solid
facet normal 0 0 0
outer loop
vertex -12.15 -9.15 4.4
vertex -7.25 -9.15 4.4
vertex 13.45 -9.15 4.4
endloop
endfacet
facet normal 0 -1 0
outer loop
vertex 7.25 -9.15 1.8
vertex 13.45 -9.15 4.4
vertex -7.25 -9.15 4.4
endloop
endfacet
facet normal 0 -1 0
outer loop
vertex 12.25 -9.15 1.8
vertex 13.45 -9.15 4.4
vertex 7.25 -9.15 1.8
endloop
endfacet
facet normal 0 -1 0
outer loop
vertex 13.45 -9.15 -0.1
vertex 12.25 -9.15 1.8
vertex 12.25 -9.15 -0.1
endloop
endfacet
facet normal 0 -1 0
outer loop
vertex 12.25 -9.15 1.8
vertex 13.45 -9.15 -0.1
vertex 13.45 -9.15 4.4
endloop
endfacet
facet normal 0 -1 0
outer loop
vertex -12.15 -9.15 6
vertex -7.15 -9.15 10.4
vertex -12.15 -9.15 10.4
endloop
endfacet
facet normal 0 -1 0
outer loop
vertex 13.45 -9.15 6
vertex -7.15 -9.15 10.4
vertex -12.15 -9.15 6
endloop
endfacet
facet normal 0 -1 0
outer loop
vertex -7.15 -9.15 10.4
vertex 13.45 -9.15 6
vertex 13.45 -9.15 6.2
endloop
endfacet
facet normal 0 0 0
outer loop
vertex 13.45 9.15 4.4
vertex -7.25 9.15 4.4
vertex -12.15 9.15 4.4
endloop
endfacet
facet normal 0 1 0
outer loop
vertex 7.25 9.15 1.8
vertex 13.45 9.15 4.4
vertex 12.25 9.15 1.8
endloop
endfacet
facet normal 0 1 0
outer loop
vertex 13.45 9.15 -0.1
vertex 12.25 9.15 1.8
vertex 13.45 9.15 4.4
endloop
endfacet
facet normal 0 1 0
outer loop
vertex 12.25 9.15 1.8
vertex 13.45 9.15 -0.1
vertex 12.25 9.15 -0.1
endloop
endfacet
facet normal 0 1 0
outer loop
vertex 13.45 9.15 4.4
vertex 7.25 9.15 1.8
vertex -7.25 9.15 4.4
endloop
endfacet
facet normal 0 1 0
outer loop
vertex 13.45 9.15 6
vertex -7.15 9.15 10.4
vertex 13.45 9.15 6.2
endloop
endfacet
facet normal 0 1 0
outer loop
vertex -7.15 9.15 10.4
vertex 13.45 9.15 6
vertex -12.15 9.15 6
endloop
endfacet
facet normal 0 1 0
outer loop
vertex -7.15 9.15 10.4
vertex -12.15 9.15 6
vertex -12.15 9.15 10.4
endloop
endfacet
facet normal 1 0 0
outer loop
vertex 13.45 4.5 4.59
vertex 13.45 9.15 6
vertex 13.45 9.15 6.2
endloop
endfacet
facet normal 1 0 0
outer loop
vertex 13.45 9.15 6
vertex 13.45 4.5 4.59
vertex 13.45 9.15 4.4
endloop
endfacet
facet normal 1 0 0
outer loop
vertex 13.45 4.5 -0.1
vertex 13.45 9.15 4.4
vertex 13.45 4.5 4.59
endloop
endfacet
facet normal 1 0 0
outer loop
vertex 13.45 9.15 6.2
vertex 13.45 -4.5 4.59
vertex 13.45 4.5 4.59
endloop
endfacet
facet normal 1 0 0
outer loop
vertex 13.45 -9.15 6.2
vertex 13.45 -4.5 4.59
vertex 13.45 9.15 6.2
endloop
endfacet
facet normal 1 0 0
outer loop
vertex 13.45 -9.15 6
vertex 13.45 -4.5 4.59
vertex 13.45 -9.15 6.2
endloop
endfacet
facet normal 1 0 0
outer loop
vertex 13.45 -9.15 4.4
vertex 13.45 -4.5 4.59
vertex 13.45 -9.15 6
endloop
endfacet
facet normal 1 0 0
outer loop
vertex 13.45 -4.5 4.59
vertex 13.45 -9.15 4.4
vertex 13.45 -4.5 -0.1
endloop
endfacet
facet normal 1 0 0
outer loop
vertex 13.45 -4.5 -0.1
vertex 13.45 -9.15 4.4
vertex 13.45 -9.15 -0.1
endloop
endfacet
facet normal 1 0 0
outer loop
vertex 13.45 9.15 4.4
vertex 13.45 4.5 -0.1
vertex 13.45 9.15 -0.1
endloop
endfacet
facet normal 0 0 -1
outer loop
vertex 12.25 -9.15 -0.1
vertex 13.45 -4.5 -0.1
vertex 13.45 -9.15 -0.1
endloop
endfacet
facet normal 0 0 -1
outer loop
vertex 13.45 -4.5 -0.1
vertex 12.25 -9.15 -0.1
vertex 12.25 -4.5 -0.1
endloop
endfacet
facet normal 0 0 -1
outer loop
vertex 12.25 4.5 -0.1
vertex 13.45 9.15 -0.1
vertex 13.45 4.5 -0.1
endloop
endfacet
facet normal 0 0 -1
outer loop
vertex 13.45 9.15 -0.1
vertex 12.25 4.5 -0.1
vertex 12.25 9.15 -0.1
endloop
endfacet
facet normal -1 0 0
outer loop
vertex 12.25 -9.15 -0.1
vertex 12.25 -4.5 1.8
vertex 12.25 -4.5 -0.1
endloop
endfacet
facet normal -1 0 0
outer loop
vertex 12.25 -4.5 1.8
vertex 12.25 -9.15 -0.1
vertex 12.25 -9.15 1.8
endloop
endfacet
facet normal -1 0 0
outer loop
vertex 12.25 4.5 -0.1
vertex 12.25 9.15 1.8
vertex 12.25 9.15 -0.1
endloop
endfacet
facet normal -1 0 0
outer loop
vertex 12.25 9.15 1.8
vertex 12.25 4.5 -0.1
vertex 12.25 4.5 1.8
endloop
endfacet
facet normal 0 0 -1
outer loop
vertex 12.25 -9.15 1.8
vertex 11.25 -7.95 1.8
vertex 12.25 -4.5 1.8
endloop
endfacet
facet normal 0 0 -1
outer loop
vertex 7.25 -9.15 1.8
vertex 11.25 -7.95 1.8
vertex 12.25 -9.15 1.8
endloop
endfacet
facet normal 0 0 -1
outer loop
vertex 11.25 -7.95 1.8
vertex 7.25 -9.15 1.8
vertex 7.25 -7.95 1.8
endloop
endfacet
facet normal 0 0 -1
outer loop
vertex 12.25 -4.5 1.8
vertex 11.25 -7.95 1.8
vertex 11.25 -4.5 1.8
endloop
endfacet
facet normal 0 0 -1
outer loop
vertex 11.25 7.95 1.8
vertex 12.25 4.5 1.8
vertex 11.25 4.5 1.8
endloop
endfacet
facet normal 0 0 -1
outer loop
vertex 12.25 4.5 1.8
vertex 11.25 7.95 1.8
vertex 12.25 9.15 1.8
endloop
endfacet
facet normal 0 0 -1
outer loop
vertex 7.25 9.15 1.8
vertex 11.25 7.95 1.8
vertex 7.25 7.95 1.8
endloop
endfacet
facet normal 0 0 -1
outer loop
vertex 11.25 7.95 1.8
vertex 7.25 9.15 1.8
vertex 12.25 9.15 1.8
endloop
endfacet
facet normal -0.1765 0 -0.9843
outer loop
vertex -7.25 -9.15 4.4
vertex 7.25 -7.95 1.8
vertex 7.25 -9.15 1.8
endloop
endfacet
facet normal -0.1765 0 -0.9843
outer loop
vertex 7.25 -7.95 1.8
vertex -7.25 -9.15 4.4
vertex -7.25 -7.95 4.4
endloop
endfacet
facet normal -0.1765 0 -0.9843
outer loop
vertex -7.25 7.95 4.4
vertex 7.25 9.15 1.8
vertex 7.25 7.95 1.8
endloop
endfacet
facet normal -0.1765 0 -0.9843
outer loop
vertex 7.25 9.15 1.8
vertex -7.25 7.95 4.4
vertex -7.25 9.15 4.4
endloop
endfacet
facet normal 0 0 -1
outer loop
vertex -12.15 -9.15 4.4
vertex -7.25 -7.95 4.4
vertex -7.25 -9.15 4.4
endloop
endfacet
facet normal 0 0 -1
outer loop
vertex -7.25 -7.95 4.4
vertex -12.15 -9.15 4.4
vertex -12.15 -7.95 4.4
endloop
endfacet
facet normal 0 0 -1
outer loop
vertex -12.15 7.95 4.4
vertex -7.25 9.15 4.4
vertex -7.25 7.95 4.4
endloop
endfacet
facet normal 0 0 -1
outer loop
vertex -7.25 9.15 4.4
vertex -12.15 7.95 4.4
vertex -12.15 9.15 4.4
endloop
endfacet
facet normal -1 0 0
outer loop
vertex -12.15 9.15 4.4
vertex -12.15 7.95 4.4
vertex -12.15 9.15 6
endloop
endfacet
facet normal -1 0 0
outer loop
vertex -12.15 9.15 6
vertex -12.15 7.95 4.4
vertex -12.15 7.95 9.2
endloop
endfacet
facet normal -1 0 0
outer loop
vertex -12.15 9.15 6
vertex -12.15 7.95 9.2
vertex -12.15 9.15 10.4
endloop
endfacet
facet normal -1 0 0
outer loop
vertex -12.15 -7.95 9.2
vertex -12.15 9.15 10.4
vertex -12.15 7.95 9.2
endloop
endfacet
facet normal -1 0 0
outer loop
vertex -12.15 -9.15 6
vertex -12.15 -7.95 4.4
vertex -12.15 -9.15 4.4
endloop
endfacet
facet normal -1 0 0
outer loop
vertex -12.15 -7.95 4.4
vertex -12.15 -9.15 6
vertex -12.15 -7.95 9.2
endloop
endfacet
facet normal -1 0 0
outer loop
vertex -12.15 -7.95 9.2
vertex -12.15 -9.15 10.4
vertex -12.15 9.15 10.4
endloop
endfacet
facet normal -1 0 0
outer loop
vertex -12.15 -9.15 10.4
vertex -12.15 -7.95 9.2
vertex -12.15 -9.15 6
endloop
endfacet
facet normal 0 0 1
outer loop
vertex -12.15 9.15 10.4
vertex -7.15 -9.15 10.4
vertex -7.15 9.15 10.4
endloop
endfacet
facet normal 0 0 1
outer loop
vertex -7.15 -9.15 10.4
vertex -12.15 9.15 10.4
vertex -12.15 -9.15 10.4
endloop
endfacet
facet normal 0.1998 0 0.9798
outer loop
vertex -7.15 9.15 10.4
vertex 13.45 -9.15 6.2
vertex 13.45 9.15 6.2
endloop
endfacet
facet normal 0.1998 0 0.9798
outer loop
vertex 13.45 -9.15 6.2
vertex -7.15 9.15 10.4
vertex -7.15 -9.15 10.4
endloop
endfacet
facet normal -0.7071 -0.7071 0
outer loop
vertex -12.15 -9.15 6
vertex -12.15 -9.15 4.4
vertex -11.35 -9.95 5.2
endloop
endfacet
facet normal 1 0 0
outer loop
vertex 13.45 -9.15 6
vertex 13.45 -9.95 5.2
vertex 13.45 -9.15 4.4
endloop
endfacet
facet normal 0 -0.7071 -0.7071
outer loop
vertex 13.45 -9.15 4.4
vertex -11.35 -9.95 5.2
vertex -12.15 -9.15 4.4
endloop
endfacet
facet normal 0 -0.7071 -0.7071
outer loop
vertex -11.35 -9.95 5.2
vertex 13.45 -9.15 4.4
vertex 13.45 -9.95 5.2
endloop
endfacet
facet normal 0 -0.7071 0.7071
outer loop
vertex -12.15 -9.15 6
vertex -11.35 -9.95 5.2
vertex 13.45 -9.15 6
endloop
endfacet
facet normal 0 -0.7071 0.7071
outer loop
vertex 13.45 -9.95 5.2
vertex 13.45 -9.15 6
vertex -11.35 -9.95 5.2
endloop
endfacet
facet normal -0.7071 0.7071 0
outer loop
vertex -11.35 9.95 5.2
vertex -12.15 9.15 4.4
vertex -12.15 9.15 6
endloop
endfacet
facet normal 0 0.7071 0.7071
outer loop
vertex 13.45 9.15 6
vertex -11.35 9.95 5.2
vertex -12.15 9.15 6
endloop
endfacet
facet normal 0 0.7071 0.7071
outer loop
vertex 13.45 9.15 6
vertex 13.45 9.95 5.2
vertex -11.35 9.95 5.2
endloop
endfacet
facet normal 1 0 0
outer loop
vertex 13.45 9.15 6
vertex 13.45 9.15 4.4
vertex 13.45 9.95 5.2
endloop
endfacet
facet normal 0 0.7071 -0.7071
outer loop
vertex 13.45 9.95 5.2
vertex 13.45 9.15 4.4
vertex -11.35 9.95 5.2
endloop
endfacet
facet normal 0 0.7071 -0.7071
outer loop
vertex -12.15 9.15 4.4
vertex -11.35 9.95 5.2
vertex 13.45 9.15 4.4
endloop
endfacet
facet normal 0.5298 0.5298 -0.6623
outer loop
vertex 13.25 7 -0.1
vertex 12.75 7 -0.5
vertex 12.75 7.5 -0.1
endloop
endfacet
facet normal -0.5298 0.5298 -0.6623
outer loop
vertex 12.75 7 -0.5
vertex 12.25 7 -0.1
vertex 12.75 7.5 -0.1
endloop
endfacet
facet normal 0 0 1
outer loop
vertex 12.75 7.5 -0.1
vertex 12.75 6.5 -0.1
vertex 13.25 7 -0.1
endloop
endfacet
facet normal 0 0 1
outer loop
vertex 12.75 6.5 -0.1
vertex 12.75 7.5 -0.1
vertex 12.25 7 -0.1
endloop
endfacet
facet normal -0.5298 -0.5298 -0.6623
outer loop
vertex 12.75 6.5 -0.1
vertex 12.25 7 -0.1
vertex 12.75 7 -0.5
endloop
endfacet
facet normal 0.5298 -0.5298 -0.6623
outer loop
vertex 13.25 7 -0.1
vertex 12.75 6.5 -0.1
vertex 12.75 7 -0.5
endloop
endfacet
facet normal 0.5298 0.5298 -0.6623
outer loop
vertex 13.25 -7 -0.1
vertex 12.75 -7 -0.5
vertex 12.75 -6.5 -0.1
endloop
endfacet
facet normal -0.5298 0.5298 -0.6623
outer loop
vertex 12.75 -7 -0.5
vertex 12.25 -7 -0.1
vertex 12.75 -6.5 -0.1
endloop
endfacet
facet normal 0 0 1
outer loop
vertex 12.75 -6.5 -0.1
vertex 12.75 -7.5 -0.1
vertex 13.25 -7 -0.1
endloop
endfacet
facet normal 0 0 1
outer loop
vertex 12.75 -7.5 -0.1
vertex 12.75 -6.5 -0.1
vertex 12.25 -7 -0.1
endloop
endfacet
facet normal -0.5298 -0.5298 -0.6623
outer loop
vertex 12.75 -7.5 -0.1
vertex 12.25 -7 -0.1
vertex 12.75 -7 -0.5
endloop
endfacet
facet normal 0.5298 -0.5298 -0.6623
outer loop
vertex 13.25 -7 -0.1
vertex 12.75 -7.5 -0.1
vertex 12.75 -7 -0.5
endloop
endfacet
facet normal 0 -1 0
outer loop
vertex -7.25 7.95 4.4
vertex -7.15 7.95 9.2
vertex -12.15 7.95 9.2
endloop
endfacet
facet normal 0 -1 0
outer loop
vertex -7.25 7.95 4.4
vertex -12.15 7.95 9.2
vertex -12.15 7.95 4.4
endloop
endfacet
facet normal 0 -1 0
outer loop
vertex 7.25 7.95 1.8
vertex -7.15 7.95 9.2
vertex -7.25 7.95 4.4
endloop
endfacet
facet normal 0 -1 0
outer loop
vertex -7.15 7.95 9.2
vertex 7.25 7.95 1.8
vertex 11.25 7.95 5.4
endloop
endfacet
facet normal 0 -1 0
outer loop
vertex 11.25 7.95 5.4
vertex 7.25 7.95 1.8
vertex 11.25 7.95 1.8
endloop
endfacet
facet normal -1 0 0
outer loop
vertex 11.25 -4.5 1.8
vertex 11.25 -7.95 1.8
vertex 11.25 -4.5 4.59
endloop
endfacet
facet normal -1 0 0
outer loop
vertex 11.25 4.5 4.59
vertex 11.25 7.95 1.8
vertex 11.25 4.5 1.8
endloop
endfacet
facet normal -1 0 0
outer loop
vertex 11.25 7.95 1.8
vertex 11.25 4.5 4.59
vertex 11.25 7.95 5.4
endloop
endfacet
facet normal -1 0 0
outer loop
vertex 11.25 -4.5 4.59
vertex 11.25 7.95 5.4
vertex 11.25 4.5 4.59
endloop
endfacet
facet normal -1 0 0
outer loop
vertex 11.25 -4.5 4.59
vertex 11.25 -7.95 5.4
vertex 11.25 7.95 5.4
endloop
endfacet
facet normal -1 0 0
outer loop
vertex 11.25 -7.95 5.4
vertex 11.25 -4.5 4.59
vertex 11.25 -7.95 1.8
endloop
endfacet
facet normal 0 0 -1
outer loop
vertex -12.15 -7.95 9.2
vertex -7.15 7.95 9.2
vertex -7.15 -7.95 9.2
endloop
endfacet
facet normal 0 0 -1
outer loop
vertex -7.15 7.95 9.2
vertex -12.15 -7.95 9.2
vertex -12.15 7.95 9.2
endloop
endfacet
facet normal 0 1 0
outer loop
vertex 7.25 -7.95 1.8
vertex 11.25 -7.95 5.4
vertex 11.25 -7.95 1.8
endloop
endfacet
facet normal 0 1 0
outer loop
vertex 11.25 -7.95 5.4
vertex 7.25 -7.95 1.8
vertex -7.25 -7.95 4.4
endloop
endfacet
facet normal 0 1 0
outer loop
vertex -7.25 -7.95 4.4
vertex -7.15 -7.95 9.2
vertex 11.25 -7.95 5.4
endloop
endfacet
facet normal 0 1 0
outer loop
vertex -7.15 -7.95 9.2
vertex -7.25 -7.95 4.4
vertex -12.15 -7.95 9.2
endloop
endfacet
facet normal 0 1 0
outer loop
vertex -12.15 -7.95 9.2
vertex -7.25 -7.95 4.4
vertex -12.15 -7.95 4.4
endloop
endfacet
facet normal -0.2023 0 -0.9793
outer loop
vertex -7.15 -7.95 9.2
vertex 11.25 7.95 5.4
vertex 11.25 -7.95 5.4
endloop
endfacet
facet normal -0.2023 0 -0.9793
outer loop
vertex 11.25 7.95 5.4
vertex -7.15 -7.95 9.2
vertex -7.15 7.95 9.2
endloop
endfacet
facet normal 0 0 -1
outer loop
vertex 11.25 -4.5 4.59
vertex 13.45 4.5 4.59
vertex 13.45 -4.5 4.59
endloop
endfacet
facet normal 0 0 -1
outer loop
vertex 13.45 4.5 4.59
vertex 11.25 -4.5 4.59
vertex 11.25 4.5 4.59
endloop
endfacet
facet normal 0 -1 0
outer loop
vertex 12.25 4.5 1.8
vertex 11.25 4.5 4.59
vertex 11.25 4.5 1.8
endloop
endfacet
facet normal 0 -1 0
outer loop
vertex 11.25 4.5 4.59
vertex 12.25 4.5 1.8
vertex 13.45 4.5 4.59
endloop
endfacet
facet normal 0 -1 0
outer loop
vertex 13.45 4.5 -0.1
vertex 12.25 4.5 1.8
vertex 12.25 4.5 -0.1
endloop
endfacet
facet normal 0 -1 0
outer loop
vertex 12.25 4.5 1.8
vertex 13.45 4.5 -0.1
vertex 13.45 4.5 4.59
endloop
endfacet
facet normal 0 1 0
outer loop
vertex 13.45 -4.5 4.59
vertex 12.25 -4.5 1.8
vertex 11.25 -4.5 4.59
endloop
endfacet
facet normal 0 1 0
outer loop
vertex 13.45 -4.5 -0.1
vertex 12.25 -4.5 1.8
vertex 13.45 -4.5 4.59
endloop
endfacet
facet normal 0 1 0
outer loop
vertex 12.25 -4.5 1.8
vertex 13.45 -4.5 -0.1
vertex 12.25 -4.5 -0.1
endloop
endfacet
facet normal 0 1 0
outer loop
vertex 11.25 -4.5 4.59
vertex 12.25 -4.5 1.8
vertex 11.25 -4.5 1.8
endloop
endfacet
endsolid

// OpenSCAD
ircap();
*render(convexity=10) ircap();
*color("#ac44") render(convexity=10) irbox();
*#digispark();

module ircap()
{
    thi = 1.2;
    hi = 10.4;
    wid = 18.5 - 0.2;
    len = 24.5 + thi*2;

    ridge = 0.8;

    difference() {
        union() {
            translate([0, -wid/2, 0]) rotate([-90,0,0])
                linear_extrude(height=wid, convexity=5) polygon([
                [24.5/2+thi, 0.1], [24.5/2, 0.1],
                [24.5/2, -1.8], [24.5/2-5, -1.8],
                [-24.5/2+5, -4.4], [-24.5/2+0.1, -4.4],
                [-24.5/2+0.1, -hi], [-24.5/2+0.1+5, -hi],
                [24.5/2+thi, -6.2],
            ]);
            
            translate([-(len)/2+thi+0.1, -(wid)/2, 4.4]) polyhedron(convexity=6,
                points = [
                    [0, 0, 0], [ridge, -ridge, ridge], [0, 0, 2*ridge],
                    [len-thi-0.1, 0, 0], [len-thi-0.1, -ridge, ridge], [len-thi-0.1, 0, 2*ridge]
                ],
                faces = [
                    [0,2,1],
                    [1,3,0], [1,4,3], [2,4,1], [2,5,4], [0,5,2], [0,3,5],
                    [5,3,4]
                ]);
            mirror([0,1,0]) translate([-(len)/2+thi+0.1, -(wid)/2, 4.4]) polyhedron(convexity=6,
                points = [
                    [0, 0, 0], [ridge, -ridge, ridge], [0, 0, 2*ridge],
                    [len-thi-0.1, 0, 0], [len-thi-0.1, -ridge, ridge], [len-thi-0.1, 0, 2*ridge]
                ],
                faces = [
                    [0,2,1],
                    [1,3,0], [1,4,3], [2,4,1], [2,5,4], [0,5,2], [0,3,5],
                    [5,3,4]
                ]);
            translate([24.5/2+thi/2-0.1, 7, -0.1]) mirror([0,0,1]) cylinder(0.4, thi/2-0.1, 0, $fn=4);
            translate([24.5/2+thi/2-0.1,-7, -0.1]) mirror([0,0,1]) cylinder(0.4, thi/2-0.1, 0, $fn=4);
        }
        translate([0, -(wid-thi*2)/2, 0]) rotate([-90,0,0])
            linear_extrude(height=wid-thi*2, convexity=5) polygon([
            [24.5/2-1, -1.79], [24.5/2-5, -1.79],
            [-24.5/2, -4.2],
            [-24.5/2, -hi+thi], [-24.5/2+0.1+5, -hi+thi],
            [24.5/2-1, -6.6+thi],
        ]);
        translate([24.5/2, 0, 4.7/2-0.11]) cube([thi+2, 9, 4.7], true);
    }
}

module irbox()
{
    thi = 1.2;
    hi = 7.5 + 1.8 + thi*2 + 1;
    wid = 18.5 + thi*2;
    len = 24.5 + thi*2;

    ridge = 0.85;

    difference() {
        union() {
            translate([-24.5/2-3.6/2, 0, hi/2+1.6-1.8-thi-1]) cube([3.6, wid, hi], true);
            translate([0, 0, -(thi+1)/2-0.2]) cube([len, wid, thi+1], true);
            translate([0, -wid/2-2+thi, 0]) rotate([-90,0,0])
                linear_extrude(height=2, convexity=6) polygon([
                    [-len/2-2.4, 2.4], [len/2, 2.4],
                    [len/2, -6.2], [-len/2+6.3, -hi+2.4],
                    [-len/2-2.4, -hi+2.4]
                ]);
            translate([0, wid/2-thi, 0]) rotate([-90,0,0])
                linear_extrude(height=2, convexity=6) polygon([
                    [-len/2-2.4, 2.4], [len/2, 2.4],
                    [len/2, -6.2], [-len/2+6.3, -hi+2.4],
                    [-len/2-2.4, -hi+2.4]
                ]);
            translate([-24.5/2, -wid/2+thi, -0.2+2.0]) linear_extrude(height=2.5, convexity=5) polygon([
                [5,0], [0,4], [0,0]
            ]);
            translate([-24.5/2, wid/2-thi, -0.2+2.0]) linear_extrude(height=2.5, convexity=5) polygon([
                [5,0], [0,-4], [0,0]
            ]);
        }
        translate([-24.5/2-3.6/2, 1.5-6.2/2, 1.6+7.5/2]) cube([3.61, 6.6, 7.9], true);
        translate([-24.5/2-1.8/2+4/2, 1.5-6.2/2, -(1.7+1.2)/2+1.5]) cube([4+1.81, 6.4, 1.7+1.21], true);
        translate([0,0,-1.2]) linear_extrude(height=1.21, convexity=5) polygon([
            [-24.5/2+4, -4.8], [-24.5/2+2, 1.5],
            [-24.5/2+2+9.3, 9.3], [-24.5/2+2+9+9.3, 9.3],
        ]);
        translate([-24.5/2, -wid/2+thi, 0]) rotate([-90,0,0])
            linear_extrude(height=wid-thi*2, convexity=5) polygon([
                [0.4,-1], [0.4,-1.8], [5,-1.8-2.5+1], [5,-1]
        ]);

        translate([-(len)/2+thi+0.1, -(wid)/2+thi, 4.3]) polyhedron(convexity=6,
            points = [
                [0, 0.01, 0], [0, -ridge, ridge], [0, 0.01, 2*ridge],
                [len-thi, 0.01, 0], [len-thi, -ridge, ridge], [len-thi, 0.01, 2*ridge]
            ],
            faces = [
                [0,2,1],
                [1,3,0], [1,4,3], [2,4,1], [2,5,4], [0,5,2], [0,3,5],
                [5,3,4]
            ]);
        mirror([0,1,0]) translate([-(len)/2+thi+0.1, -(wid)/2+thi, 4.3]) polyhedron(convexity=6,
            points = [
                [0, 0.01, 0], [0, -ridge, ridge], [0, 0.01, 2*ridge],
                [len-thi, 0.01, 0], [len-thi, -ridge, ridge], [len-thi, 0.01, 2*ridge]
            ],
            faces = [
                [0,2,1],
                [1,3,0], [1,4,3], [2,4,1], [2,5,4], [0,5,2], [0,3,5],
                [5,3,4]
            ]);

            translate([24.5/2+thi/2-0.1, 7, -0.1]) mirror([0,0,1]) cylinder(0.55, thi/2+0.1, 0, $fn=4);
            translate([24.5/2+thi/2-0.1,-7, -0.1]) mirror([0,0,1]) cylinder(0.55, thi/2+0.1, 0, $fn=4);
    }

}

module digispark()
{
    union() {
        translate([0, 0, 1.4/2]) cube([24.5, 18.5, 1.8], true);
        translate([24.5/2-5.5/2, 0, 4/2]) cube([5.5, 7.5, 4], true);
        translate([-24.5/2-3.6/2, 1.5-6.2/2, 1.6+7.5/2]) cube([3.6, 6.2, 7.5], true);
    }
}
